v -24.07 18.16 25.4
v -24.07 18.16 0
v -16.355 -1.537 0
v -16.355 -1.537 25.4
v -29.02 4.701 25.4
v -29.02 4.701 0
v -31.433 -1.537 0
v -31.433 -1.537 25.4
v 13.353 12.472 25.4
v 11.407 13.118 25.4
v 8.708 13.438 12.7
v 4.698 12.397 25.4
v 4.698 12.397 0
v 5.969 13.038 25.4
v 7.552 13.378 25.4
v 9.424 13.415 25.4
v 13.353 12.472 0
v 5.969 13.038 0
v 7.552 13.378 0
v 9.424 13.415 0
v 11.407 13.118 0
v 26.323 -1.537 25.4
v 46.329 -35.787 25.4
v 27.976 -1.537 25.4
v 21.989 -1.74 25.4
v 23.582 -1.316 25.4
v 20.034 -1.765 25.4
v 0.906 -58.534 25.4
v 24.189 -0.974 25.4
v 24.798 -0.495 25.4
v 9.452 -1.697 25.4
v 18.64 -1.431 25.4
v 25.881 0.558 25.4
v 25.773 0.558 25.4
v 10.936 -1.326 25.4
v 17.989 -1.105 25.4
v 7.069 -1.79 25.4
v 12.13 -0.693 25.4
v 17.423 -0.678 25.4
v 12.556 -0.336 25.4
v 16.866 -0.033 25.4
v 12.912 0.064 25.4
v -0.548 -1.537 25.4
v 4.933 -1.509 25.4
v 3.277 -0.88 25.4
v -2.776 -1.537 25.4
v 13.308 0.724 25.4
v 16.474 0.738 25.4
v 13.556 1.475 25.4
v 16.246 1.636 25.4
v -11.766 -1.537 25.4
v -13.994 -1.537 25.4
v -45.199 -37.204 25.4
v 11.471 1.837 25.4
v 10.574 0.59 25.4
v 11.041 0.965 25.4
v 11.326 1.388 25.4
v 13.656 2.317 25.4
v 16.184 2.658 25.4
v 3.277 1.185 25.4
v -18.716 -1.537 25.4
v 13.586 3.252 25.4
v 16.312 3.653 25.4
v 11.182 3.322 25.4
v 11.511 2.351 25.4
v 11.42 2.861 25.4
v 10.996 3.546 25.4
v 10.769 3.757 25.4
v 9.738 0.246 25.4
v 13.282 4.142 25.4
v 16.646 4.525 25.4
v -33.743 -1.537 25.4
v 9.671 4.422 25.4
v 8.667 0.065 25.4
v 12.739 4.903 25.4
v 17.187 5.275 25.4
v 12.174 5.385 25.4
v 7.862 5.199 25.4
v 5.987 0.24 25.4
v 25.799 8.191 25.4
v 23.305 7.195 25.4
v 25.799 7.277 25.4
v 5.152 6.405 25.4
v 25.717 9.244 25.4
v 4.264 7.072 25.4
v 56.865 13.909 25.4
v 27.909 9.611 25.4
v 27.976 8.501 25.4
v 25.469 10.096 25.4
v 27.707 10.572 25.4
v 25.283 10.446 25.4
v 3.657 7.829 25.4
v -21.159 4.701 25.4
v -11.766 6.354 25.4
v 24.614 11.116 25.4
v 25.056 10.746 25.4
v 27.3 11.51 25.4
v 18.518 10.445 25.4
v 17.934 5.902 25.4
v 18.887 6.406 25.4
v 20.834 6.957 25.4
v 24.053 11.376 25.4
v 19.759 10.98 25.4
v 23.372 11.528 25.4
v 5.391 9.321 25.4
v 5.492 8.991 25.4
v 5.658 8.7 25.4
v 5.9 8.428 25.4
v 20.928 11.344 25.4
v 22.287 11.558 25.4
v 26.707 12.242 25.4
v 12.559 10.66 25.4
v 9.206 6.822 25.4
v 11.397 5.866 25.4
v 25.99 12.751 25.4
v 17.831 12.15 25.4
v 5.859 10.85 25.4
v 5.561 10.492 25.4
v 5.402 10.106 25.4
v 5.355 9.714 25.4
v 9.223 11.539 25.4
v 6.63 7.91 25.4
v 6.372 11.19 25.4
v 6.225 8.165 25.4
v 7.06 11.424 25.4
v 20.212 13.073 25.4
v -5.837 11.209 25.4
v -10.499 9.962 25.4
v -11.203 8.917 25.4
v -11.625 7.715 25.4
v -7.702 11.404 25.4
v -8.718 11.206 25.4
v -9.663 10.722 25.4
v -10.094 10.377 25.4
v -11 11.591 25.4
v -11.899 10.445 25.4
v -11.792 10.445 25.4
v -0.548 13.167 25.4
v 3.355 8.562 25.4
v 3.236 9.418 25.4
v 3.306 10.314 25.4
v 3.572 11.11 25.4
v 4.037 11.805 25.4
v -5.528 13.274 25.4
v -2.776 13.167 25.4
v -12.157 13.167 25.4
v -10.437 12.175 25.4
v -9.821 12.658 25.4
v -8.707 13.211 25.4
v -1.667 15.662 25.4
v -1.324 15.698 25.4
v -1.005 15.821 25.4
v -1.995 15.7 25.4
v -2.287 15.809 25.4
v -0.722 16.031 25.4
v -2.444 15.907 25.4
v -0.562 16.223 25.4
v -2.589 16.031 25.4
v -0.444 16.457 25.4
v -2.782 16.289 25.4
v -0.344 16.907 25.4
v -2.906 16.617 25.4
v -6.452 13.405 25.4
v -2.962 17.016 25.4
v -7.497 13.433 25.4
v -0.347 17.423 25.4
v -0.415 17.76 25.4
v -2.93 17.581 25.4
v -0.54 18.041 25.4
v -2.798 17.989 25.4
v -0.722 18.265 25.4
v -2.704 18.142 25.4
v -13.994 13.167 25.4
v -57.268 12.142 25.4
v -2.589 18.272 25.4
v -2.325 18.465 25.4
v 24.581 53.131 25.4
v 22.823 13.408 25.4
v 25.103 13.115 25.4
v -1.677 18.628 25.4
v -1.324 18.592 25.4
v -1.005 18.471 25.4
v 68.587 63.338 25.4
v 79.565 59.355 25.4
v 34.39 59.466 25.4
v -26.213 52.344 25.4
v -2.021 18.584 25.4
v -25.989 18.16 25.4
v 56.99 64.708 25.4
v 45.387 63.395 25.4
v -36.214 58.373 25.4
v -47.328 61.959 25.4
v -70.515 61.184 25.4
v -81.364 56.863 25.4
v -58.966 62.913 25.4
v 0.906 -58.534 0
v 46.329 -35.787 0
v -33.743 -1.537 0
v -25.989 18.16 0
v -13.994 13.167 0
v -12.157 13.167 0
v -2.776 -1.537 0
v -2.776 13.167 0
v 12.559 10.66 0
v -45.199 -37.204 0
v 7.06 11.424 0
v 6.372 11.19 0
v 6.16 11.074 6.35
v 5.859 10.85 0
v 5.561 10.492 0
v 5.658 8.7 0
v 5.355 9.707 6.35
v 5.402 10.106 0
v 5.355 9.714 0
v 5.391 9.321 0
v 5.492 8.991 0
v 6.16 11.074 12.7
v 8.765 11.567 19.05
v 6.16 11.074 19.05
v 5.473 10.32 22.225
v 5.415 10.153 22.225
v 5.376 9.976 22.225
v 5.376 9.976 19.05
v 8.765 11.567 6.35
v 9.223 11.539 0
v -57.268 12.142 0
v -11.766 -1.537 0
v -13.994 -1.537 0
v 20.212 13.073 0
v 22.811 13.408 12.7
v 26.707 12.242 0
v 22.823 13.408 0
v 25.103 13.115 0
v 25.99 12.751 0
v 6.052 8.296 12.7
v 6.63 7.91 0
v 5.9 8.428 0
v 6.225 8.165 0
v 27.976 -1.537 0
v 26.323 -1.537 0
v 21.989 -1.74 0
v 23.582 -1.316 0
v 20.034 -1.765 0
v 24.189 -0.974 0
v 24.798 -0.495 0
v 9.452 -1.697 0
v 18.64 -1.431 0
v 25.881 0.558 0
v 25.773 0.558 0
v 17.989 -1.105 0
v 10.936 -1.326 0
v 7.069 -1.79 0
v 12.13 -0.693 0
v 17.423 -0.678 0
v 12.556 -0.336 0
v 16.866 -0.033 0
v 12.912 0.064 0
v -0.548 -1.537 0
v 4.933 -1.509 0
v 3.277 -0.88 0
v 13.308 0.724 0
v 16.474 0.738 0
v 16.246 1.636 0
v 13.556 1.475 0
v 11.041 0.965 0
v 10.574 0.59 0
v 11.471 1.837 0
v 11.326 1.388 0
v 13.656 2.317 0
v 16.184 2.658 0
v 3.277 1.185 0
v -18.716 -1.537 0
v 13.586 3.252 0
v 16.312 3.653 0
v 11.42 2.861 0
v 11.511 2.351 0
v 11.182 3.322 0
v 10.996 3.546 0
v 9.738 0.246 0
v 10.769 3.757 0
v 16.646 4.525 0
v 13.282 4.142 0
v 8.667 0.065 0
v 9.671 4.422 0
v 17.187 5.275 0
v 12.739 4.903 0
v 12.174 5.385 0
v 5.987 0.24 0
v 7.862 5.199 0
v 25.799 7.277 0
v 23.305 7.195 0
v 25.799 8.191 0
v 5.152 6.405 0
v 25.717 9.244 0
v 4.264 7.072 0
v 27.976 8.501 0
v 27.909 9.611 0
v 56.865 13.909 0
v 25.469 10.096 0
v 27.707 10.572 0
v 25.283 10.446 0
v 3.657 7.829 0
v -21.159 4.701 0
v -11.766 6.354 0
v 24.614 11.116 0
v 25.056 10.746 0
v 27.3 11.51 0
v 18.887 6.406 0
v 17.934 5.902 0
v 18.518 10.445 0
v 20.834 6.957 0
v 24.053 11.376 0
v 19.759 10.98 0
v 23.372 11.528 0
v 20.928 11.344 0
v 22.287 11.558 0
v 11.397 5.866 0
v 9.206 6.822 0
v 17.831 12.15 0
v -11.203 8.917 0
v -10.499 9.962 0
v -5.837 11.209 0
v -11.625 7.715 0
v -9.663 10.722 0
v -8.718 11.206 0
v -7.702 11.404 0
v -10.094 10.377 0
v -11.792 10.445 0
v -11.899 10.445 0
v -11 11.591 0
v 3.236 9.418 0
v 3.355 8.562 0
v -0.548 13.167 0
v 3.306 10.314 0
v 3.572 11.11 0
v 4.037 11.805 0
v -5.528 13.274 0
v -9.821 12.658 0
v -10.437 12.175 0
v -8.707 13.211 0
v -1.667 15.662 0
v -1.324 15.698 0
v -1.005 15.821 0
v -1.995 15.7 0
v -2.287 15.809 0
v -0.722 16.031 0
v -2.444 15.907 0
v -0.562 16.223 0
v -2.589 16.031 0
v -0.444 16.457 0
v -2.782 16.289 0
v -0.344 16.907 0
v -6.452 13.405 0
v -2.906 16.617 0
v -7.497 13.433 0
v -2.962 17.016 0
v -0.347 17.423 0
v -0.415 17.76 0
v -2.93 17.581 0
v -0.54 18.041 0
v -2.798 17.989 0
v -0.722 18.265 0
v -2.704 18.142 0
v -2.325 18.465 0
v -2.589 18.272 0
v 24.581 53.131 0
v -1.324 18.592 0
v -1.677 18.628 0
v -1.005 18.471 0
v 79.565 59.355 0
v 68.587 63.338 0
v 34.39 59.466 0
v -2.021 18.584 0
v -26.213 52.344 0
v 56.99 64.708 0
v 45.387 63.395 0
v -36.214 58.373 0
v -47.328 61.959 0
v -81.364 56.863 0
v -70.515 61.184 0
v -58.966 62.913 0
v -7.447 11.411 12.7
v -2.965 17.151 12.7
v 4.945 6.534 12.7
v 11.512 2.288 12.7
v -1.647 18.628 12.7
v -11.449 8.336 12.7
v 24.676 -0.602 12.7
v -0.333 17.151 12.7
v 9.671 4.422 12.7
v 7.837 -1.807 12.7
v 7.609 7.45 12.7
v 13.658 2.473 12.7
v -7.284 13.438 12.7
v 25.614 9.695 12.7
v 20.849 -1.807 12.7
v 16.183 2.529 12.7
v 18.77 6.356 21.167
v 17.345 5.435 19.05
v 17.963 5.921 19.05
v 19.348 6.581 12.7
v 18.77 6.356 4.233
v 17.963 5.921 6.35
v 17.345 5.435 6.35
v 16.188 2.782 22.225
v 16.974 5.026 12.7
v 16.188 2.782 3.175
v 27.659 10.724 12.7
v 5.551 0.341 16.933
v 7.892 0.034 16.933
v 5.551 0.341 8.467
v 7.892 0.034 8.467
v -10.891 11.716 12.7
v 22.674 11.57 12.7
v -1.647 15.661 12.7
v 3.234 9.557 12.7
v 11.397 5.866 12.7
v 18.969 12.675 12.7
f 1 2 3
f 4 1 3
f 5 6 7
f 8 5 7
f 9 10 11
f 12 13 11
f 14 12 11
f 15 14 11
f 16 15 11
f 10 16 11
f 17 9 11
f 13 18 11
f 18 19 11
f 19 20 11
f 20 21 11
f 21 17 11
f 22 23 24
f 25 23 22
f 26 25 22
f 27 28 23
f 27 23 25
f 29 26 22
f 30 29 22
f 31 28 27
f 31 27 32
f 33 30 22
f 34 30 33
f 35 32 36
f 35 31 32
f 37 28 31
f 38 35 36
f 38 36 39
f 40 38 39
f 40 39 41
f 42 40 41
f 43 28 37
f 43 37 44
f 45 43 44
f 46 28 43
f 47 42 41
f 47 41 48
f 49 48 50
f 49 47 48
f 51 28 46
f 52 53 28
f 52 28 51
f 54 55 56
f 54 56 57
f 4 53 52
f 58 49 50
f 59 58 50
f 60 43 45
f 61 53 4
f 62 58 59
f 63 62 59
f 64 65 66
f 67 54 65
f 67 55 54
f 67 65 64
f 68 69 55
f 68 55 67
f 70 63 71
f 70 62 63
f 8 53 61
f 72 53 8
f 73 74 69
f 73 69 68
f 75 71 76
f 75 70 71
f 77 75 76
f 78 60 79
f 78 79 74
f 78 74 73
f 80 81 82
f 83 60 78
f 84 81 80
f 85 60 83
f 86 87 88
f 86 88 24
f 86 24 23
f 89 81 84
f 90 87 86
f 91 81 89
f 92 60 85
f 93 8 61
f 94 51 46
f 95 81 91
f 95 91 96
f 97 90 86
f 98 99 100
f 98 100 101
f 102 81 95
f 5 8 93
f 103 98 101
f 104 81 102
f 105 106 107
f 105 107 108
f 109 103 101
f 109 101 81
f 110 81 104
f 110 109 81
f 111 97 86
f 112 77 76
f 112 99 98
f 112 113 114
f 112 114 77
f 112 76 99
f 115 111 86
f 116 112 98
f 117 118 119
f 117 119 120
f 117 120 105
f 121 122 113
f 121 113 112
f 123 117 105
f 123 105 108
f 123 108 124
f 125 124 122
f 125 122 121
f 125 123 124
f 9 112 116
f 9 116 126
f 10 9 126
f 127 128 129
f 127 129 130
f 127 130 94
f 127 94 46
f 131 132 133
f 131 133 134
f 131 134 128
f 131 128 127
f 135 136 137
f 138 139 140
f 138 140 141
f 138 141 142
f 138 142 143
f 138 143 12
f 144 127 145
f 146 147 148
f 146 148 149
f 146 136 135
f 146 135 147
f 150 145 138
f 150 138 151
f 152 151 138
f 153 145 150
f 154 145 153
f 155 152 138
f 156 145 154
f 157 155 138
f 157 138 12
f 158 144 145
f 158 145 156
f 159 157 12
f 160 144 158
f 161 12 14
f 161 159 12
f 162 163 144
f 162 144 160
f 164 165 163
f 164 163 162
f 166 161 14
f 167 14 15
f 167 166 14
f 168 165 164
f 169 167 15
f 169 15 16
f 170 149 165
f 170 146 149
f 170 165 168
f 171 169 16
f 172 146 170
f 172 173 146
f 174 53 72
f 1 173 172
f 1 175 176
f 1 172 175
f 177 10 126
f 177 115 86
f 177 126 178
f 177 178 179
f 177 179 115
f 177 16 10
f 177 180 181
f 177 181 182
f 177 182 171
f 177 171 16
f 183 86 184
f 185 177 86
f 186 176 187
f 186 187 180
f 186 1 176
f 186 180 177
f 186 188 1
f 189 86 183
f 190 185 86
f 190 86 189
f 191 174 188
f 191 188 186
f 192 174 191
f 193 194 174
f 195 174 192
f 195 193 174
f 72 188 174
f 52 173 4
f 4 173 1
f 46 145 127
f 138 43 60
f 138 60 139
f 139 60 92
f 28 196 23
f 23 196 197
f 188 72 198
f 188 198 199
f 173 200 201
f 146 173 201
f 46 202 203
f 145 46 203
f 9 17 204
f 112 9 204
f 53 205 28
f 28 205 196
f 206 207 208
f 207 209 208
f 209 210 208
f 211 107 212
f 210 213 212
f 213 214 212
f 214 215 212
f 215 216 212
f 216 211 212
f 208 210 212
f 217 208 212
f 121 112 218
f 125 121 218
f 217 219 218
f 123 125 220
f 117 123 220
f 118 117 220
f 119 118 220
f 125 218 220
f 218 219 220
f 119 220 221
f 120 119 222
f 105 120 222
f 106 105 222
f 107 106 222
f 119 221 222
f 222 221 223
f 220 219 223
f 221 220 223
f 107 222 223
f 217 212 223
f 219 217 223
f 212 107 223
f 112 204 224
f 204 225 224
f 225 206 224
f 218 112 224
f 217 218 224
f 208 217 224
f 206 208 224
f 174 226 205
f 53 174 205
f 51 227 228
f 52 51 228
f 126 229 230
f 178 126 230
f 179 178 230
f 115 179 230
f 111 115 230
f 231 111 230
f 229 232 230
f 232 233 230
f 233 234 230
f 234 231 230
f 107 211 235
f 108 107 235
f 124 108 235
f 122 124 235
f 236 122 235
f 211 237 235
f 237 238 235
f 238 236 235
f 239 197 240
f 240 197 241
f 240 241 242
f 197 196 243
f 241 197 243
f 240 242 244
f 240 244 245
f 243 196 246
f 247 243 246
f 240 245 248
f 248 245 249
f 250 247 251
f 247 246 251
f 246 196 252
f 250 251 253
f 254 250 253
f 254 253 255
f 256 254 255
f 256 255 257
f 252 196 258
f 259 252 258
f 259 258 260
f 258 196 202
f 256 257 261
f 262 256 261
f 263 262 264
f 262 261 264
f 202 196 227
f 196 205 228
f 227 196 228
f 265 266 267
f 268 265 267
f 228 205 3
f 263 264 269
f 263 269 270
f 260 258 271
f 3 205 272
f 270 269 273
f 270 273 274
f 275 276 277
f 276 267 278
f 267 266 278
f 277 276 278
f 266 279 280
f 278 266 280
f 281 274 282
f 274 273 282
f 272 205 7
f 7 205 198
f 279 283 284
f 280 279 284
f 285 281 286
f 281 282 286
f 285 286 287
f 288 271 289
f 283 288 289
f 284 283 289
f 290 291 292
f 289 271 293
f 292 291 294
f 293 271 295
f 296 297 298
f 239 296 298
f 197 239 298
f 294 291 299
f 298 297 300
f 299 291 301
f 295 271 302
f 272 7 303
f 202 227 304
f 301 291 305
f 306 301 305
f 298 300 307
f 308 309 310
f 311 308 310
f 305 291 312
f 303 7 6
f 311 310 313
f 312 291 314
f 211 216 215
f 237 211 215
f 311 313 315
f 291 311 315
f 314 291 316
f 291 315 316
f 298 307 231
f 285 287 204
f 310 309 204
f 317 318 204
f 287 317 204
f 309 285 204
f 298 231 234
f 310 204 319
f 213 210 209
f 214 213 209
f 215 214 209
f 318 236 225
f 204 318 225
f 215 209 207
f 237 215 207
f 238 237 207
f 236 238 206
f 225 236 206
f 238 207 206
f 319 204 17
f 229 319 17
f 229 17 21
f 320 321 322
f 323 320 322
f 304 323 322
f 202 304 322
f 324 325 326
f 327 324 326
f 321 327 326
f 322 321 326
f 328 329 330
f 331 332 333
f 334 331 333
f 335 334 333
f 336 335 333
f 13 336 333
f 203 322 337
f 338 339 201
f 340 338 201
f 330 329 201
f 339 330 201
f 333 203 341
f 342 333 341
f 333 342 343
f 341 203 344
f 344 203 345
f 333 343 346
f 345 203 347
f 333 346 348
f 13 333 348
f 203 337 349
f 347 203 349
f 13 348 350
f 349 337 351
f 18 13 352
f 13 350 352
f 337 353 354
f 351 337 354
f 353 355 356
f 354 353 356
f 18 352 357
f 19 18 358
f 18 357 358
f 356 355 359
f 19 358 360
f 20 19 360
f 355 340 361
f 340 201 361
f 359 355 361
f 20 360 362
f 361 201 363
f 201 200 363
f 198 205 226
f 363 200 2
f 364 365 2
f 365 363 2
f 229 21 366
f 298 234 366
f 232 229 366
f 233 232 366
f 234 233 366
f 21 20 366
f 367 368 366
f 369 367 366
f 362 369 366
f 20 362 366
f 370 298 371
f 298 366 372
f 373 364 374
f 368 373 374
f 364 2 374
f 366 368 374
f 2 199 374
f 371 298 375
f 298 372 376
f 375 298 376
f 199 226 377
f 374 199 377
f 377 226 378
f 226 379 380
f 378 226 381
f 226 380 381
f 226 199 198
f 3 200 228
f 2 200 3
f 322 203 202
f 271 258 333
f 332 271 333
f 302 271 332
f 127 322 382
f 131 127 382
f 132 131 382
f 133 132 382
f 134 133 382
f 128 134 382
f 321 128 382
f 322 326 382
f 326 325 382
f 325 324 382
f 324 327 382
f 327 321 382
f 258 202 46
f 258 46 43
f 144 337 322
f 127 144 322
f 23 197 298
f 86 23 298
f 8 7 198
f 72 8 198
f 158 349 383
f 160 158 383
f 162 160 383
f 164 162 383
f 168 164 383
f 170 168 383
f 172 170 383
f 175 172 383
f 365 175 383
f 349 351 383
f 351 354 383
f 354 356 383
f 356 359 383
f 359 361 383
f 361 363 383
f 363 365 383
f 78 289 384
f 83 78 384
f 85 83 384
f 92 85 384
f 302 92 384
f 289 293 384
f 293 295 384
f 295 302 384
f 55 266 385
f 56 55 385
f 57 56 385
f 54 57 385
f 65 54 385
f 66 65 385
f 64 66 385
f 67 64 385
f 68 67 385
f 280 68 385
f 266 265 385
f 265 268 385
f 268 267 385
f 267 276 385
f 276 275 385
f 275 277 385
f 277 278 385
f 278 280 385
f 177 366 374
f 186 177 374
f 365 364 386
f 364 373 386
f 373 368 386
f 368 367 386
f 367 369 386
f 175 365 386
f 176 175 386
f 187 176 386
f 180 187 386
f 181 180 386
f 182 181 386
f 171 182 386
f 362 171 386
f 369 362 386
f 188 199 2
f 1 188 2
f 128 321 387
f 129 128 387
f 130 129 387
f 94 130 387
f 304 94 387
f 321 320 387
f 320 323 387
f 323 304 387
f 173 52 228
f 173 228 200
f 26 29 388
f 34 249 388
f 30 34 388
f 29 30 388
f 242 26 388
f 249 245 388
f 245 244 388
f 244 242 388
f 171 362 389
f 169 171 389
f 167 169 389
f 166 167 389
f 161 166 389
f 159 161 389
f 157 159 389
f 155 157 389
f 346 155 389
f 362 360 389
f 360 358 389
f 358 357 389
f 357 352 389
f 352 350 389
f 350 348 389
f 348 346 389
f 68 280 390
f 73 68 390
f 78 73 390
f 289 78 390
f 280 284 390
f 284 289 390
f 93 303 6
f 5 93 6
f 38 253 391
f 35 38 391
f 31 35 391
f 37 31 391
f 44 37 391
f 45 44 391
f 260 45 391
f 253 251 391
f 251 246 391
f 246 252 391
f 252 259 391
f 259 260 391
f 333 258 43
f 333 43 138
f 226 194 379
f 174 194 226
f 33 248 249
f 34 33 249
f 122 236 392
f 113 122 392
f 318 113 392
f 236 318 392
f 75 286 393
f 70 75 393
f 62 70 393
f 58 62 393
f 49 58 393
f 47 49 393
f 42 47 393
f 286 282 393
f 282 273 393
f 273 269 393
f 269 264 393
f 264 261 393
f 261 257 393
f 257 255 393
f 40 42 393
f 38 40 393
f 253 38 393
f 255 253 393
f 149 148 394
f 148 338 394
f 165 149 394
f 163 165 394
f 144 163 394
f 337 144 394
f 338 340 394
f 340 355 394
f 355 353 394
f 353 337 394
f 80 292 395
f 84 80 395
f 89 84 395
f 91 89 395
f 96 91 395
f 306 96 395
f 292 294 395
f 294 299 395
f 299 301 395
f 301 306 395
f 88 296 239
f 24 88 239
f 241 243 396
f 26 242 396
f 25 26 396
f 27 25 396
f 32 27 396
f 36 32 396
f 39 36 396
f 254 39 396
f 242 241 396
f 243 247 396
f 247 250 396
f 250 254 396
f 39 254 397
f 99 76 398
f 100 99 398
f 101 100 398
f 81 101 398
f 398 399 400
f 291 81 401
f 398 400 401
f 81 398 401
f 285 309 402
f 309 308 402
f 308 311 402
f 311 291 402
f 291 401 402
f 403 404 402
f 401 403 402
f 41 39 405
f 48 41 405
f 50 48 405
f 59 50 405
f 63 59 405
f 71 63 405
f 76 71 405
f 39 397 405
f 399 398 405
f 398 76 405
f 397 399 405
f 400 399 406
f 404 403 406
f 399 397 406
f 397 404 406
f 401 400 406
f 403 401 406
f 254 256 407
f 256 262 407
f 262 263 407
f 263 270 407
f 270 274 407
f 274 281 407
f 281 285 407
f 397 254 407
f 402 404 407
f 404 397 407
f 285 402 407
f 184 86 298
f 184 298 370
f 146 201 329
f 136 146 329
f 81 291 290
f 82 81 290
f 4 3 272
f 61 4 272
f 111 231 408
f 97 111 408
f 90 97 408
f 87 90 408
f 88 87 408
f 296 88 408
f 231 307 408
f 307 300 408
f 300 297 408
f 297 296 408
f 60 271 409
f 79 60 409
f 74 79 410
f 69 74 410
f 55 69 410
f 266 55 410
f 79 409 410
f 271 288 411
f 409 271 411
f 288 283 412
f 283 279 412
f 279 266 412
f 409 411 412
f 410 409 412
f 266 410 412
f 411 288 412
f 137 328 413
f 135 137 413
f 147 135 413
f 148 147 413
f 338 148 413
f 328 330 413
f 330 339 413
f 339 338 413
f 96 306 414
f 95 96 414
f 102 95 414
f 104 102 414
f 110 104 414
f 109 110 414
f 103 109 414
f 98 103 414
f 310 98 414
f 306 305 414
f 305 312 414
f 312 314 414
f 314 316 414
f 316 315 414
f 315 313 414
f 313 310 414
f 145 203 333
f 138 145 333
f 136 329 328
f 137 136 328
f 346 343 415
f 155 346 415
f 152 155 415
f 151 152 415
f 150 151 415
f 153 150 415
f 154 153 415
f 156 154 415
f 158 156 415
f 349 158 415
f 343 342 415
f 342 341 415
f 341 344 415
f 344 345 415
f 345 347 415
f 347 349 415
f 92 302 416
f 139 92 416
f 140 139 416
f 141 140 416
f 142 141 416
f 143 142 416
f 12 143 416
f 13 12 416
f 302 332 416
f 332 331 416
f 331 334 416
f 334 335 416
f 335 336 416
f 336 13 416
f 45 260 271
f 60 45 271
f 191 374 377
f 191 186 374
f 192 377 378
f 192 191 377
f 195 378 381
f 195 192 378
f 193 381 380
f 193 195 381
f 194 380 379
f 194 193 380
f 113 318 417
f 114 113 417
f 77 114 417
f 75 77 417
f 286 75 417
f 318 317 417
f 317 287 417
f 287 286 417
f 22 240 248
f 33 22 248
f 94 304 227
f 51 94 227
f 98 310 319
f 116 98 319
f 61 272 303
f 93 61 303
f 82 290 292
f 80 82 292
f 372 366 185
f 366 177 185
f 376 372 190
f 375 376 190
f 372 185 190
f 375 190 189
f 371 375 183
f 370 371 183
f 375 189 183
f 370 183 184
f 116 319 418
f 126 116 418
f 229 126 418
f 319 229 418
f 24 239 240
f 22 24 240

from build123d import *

# Parameters (mm, degrees)
F0_W       = 2.2281454939
F0_H       = 14.7040429991
F1_DEPTH   = 25.4
F1_FACE_W  = 50.8
F1_FACE_H  = 25.4
F2_ANGLE   = 66
F1_FACE1_W = 50.8
F1_FACE1_H = 25.4
F3_ANGLE   = 66


with BuildPart() as f1:
    # F0 (on Top) → F1 (new body)
    with BuildSketch(Plane.XY):
        Polygon((-26.2134087423, 52.3441413045), (-57.2680906174, 12.1415700729), (-45.1987322015, -37.2038510665), (0.9061934483, -58.5340135326), (46.3287369485, -35.7868699324), (56.8647965925, 13.9085166461), (24.5805045719, 53.130506508), align=None)
        Polygon((-16.3552618695, -1.5368833827), (-18.7164950518, -1.5368833827), (-21.1592981077, 4.7010653699), (-29.0200580293, 4.7010653699), (-31.4328090265, -1.5368833827), (-33.742524394, -1.5368833827), (-25.9890932534, 18.1600945092), (-24.0700546489, 18.1600945092), align=None, mode=Mode.SUBTRACT)
        with BuildLine():
            add(Edge.make_bspline(
                [(-9.8210856812, 12.6584211944), (-8.6662279975, 13.4376281445), (-7.283833298, 13.4376281445)],
                knots=[0, 0, 0, 1, 1, 1], degree=2))
            add(Edge.make_bspline(
                [(-7.283833298, 13.4376281445), (-6.3049948152, 13.4376281445), (-5.5279344406, 13.2744883974)],
                knots=[0, 0, 0, 1, 1, 1], degree=2))
            Line((-5.5279344406, 13.2744883974), (-5.8370413299, 11.2094826507))
            add(Edge.make_bspline(
                [(-5.8370413299, 11.2094826507), (-6.747189393, 11.411260759), (-7.4469730452, 11.411260759)],
                knots=[0, 0, 0, 1, 1, 1], degree=2))
            add(Edge.make_bspline(
                [(-7.4469730452, 11.411260759), (-9.2329239613, 11.411260759), (-10.4994035773, 9.9623222153)],
                knots=[0, 0, 0, 1, 1, 1], degree=2))
            add(Edge.make_bspline(
                [(-10.4994035773, 9.9623222153), (-11.7658831932, 8.5133836715), (-11.7658831932, 6.3539285975)],
                knots=[0, 0, 0, 1, 1, 1], degree=2))
            Line((-11.7658831932, 6.3539285975), (-11.7658831932, -1.5368833827))
            Line((-11.7658831932, -1.5368833827), (-13.9940286871, -1.5368833827))
            Line((-13.9940286871, -1.5368833827), (-13.9940286871, 13.1671596164))
            Line((-13.9940286871, 13.1671596164), (-12.1565599561, 13.1671596164))
            Line((-12.1565599561, 13.1671596164), (-11.8989708817, 10.4453017298))
            Line((-11.8989708817, 10.4453017298), (-11.7916421007, 10.4453017298))
            add(Edge.make_bspline(
                [(-11.7916421007, 10.4453017298), (-10.975943365, 11.8792142442), (-9.8210856812, 12.6584211944)],
                knots=[0, 0, 0, 1, 1, 1], degree=2))
        make_face(mode=Mode.SUBTRACT)
        with Locations((-1.6619517484, 5.8151381168)):
            Rectangle(F0_W, F0_H, mode=Mode.SUBTRACT)
        with BuildLine():
            add(Edge.make_bspline(
                [(-2.5892724164, 16.0306914939), (-2.96492315, 16.3999025006), (-2.96492315, 17.1512039677)],
                knots=[0, 0, 0, 1, 1, 1], degree=2))
            add(Edge.make_bspline(
                [(-2.96492315, 17.1512039677), (-2.96492315, 17.9153848885), (-2.5892724164, 18.2717164415)],
                knots=[0, 0, 0, 1, 1, 1], degree=2))
            add(Edge.make_bspline(
                [(-2.5892724164, 18.2717164415), (-2.2136216829, 18.6280479944), (-1.6469257191, 18.6280479944)],
                knots=[0, 0, 0, 1, 1, 1], degree=2))
            add(Edge.make_bspline(
                [(-1.6469257191, 18.6280479944), (-1.110281814, 18.6280479944), (-0.7217516267, 18.2652767146)],
                knots=[0, 0, 0, 1, 1, 1], degree=2))
            add(Edge.make_bspline(
                [(-0.7217516267, 18.2652767146), (-0.3332214395, 17.9025054348), (-0.3332214395, 17.1512039677)],
                knots=[0, 0, 0, 1, 1, 1], degree=2))
            add(Edge.make_bspline(
                [(-0.3332214395, 17.1512039677), (-0.3332214395, 16.3999025006), (-0.7217516267, 16.0306914939)],
                knots=[0, 0, 0, 1, 1, 1], degree=2))
            add(Edge.make_bspline(
                [(-0.7217516267, 16.0306914939), (-1.110281814, 15.6614804872), (-1.6469257191, 15.6614804872)],
                knots=[0, 0, 0, 1, 1, 1], degree=2))
            add(Edge.make_bspline(
                [(-1.6469257191, 15.6614804872), (-2.2136216829, 15.6614804872), (-2.5892724164, 16.0306914939)],
                knots=[0, 0, 0, 1, 1, 1], degree=2))
        make_face(mode=Mode.SUBTRACT)
        with BuildLine():
            add(Edge.make_bspline(
                [(12.7394240882, 4.9028434782), (13.6581584537, 3.936884449), (13.6581584537, 2.472919876)],
                knots=[0, 0, 0, 1, 1, 1], degree=2))
            add(Edge.make_bspline(
                [(13.6581584537, 2.472919876), (13.6581584537, 0.420793583), (12.129796612, -0.693279164)],
                knots=[0, 0, 0, 1, 1, 1], degree=2))
            add(Edge.make_bspline(
                [(12.129796612, -0.693279164), (10.6014347704, -1.8073519109), (7.8366453714, -1.8073519109)],
                knots=[0, 0, 0, 1, 1, 1], degree=2))
            add(Edge.make_bspline(
                [(7.8366453714, -1.8073519109), (4.9130093766, -1.8073519109), (3.2773187539, -0.8800312429)],
                knots=[0, 0, 0, 1, 1, 1], degree=2))
            Line((3.2773187539, -0.8800312429), (3.2773187539, 1.1849745038))
            add(Edge.make_bspline(
                [(3.2773187539, 1.1849745038), (4.3377271103, 0.6483305987), (5.5505423358, 0.341370285)],
                knots=[0, 0, 0, 1, 1, 1], degree=2))
            add(Edge.make_bspline(
                [(5.5505423358, 0.341370285), (6.7633575613, 0.0344099713), (7.8924563376, 0.0344099713)],
                knots=[0, 0, 0, 1, 1, 1], degree=2))
            add(Edge.make_bspline(
                [(7.8924563376, 0.0344099713), (9.6354757412, 0.0344099713), (10.5735292873, 0.590373057)],
                knots=[0, 0, 0, 1, 1, 1], degree=2))
            add(Edge.make_bspline(
                [(10.5735292873, 0.590373057), (11.5115828334, 1.1463361426), (11.5115828334, 2.2883143727)],
                knots=[0, 0, 0, 1, 1, 1], degree=2))
            add(Edge.make_bspline(
                [(11.5115828334, 2.2883143727), (11.5115828334, 3.1469446208), (10.7688676688, 3.7565720969)],
                knots=[0, 0, 0, 1, 1, 1], degree=2))
            add(Edge.make_bspline(
                [(10.7688676688, 3.7565720969), (10.0261525041, 4.3661995731), (7.8624042789, 5.1990709138)],
                knots=[0, 0, 0, 1, 1, 1], degree=2))
            add(Edge.make_bspline(
                [(7.8624042789, 5.1990709138), (5.8102779859, 5.9632518346), (4.9452080109, 6.5342409496)],
                knots=[0, 0, 0, 1, 1, 1], degree=2))
            add(Edge.make_bspline(
                [(4.9452080109, 6.5342409496), (4.0801380359, 7.1052300646), (3.6572626387, 7.8286260487)],
                knots=[0, 0, 0, 1, 1, 1], degree=2))
            add(Edge.make_bspline(
                [(3.6572626387, 7.8286260487), (3.2343872415, 8.5520220327), (3.2343872415, 9.556619423)],
                knots=[0, 0, 0, 1, 1, 1], degree=2))
            add(Edge.make_bspline(
                [(3.2343872415, 9.556619423), (3.2343872415, 11.3554497928), (4.6983518145, 12.3965389687)],
                knots=[0, 0, 0, 1, 1, 1], degree=2))
            add(Edge.make_bspline(
                [(4.6983518145, 12.3965389687), (6.1623163876, 13.4376281445), (8.7081550733, 13.4376281445)],
                knots=[0, 0, 0, 1, 1, 1], degree=2))
            add(Edge.make_bspline(
                [(8.7081550733, 13.4376281445), (11.0822677093, 13.4376281445), (13.3533447156, 12.4716691154)],
                knots=[0, 0, 0, 1, 1, 1], degree=2))
            Line((13.3533447156, 12.4716691154), (12.5591117361, 10.6599592919))
            add(Edge.make_bspline(
                [(12.5591117361, 10.6599592919), (10.3481388472, 11.5701073549), (8.5493084774, 11.5701073549)],
                knots=[0, 0, 0, 1, 1, 1], degree=2))
            add(Edge.make_bspline(
                [(8.5493084774, 11.5701073549), (6.9651356696, 11.5701073549), (6.160169812, 11.0742483866)],
                knots=[0, 0, 0, 1, 1, 1], degree=2))
            add(Edge.make_bspline(
                [(6.160169812, 11.0742483866), (5.3552039544, 10.5783894183), (5.3552039544, 9.7068797164)],
                knots=[0, 0, 0, 1, 1, 1], degree=2))
            add(Edge.make_bspline(
                [(5.3552039544, 9.7068797164), (5.3552039544, 9.1144248452), (5.6578711168, 8.7001357505)],
                knots=[0, 0, 0, 1, 1, 1], degree=2))
            add(Edge.make_bspline(
                [(5.6578711168, 8.7001357505), (5.9605382793, 8.2858466558), (6.6302698728, 7.9101959222)],
                knots=[0, 0, 0, 1, 1, 1], degree=2))
            add(Edge.make_bspline(
                [(6.6302698728, 7.9101959222), (7.3000014664, 7.5345451887), (9.2061606172, 6.8218820827)],
                knots=[0, 0, 0, 1, 1, 1], degree=2))
            add(Edge.make_bspline(
                [(9.2061606172, 6.8218820827), (11.8206897227, 5.8688025073), (12.7394240882, 4.9028434782)],
                knots=[0, 0, 0, 1, 1, 1], degree=2))
        make_face(mode=Mode.SUBTRACT)
        with BuildLine():
            Line((27.9758178412, -1.5368833827), (26.3229546135, -1.5368833827))
            Line((26.3229546135, -1.5368833827), (25.8807600358, 0.5581744227))
            Line((25.8807600358, 0.5581744227), (25.7734312547, 0.5581744227))
            add(Edge.make_bspline(
                [(25.7734312547, 0.5581744227), (24.6743845371, -0.8242202768), (23.5817775464, -1.3157860938)],
                knots=[0, 0, 0, 1, 1, 1], degree=2))
            add(Edge.make_bspline(
                [(23.5817775464, -1.3157860938), (22.4891705557, -1.8073519109), (20.8491867817, -1.8073519109)],
                knots=[0, 0, 0, 1, 1, 1], degree=2))
            add(Edge.make_bspline(
                [(20.8491867817, -1.8073519109), (18.6639728003, -1.8073519109), (17.4232520917, -0.6782531346)],
                knots=[0, 0, 0, 1, 1, 1], degree=2))
            add(Edge.make_bspline(
                [(17.4232520917, -0.6782531346), (16.1825313832, 0.4508456417), (16.1825313832, 2.5287308421)],
                knots=[0, 0, 0, 1, 1, 1], degree=2))
            add(Edge.make_bspline(
                [(16.1825313832, 2.5287308421), (16.1825313832, 6.9807286786), (23.3048692914, 7.1953862407)],
                knots=[0, 0, 0, 1, 1, 1], degree=2))
            Line((23.3048692914, 7.1953862407), (25.7991901622, 7.2769561142))
            Line((25.7991901622, 7.2769561142), (25.7991901622, 8.1913973285))
            add(Edge.make_bspline(
                [(25.7991901622, 8.1913973285), (25.7991901622, 9.9215372785), (25.0564749976, 10.7458223167)],
                knots=[0, 0, 0, 1, 1, 1], degree=2))
            add(Edge.make_bspline(
                [(25.0564749976, 10.7458223167), (24.3137598329, 11.5701073549), (22.673776059, 11.5701073549)],
                knots=[0, 0, 0, 1, 1, 1], degree=2))
            add(Edge.make_bspline(
                [(22.673776059, 11.5701073549), (20.836307328, 11.5701073549), (18.5180056581, 10.4453017298)],
                knots=[0, 0, 0, 1, 1, 1], degree=2))
            Line((18.5180056581, 10.4453017298), (17.8311014596, 12.1496827724))
            add(Edge.make_bspline(
                [(17.8311014596, 12.1496827724), (18.9172687235, 12.7378444923), (20.2116538225, 13.0727102891)],
                knots=[0, 0, 0, 1, 1, 1], degree=2))
            add(Edge.make_bspline(
                [(20.2116538225, 13.0727102891), (21.5060389216, 13.4075760859), (22.8111568987, 13.4075760859)],
                knots=[0, 0, 0, 1, 1, 1], degree=2))
            add(Edge.make_bspline(
                [(22.8111568987, 13.4075760859), (25.438565458, 13.4075760859), (26.7071916496, 12.241985524)],
                knots=[0, 0, 0, 1, 1, 1], degree=2))
            add(Edge.make_bspline(
                [(26.7071916496, 12.241985524), (27.9758178412, 11.0763949622), (27.9758178412, 8.5005042178)],
                knots=[0, 0, 0, 1, 1, 1], degree=2))
            Line((27.9758178412, 8.5005042178), (27.9758178412, -1.5368833827))
        make_face(mode=Mode.SUBTRACT)
    extrude(amount=F1_DEPTH)

    # F1_face (on face) → F2 (revolve)
    with BuildSketch(Plane(origin=(40.7226505822, 33.519511577, 12.7), x_dir=(-0.6355175595, 0.7720864146, 0), z_dir=(0.7720864146, 0.6355175595, 0))):
        Rectangle(F1_FACE_W, F1_FACE_H)
    revolve(axis=Axis((56.8647965925, 13.9085166461, 12.7), (0, 0, -1)), revolution_arc=F2_ANGLE)

    # F1_face1 (on face) → F3 (revolve)
    with BuildSketch(Plane(origin=(-41.7407496799, 32.2428556887, 12.7), x_dir=(-0.6113126353, -0.7913891975, 0), z_dir=(-0.7913891975, 0.6113126353, 0))):
        Rectangle(F1_FACE1_W, F1_FACE1_H)
    revolve(axis=Axis((-57.2680906174, 12.1415700729, 12.7), (0, 0, 1)), revolution_arc=F3_ANGLE)


solid = f1.part
